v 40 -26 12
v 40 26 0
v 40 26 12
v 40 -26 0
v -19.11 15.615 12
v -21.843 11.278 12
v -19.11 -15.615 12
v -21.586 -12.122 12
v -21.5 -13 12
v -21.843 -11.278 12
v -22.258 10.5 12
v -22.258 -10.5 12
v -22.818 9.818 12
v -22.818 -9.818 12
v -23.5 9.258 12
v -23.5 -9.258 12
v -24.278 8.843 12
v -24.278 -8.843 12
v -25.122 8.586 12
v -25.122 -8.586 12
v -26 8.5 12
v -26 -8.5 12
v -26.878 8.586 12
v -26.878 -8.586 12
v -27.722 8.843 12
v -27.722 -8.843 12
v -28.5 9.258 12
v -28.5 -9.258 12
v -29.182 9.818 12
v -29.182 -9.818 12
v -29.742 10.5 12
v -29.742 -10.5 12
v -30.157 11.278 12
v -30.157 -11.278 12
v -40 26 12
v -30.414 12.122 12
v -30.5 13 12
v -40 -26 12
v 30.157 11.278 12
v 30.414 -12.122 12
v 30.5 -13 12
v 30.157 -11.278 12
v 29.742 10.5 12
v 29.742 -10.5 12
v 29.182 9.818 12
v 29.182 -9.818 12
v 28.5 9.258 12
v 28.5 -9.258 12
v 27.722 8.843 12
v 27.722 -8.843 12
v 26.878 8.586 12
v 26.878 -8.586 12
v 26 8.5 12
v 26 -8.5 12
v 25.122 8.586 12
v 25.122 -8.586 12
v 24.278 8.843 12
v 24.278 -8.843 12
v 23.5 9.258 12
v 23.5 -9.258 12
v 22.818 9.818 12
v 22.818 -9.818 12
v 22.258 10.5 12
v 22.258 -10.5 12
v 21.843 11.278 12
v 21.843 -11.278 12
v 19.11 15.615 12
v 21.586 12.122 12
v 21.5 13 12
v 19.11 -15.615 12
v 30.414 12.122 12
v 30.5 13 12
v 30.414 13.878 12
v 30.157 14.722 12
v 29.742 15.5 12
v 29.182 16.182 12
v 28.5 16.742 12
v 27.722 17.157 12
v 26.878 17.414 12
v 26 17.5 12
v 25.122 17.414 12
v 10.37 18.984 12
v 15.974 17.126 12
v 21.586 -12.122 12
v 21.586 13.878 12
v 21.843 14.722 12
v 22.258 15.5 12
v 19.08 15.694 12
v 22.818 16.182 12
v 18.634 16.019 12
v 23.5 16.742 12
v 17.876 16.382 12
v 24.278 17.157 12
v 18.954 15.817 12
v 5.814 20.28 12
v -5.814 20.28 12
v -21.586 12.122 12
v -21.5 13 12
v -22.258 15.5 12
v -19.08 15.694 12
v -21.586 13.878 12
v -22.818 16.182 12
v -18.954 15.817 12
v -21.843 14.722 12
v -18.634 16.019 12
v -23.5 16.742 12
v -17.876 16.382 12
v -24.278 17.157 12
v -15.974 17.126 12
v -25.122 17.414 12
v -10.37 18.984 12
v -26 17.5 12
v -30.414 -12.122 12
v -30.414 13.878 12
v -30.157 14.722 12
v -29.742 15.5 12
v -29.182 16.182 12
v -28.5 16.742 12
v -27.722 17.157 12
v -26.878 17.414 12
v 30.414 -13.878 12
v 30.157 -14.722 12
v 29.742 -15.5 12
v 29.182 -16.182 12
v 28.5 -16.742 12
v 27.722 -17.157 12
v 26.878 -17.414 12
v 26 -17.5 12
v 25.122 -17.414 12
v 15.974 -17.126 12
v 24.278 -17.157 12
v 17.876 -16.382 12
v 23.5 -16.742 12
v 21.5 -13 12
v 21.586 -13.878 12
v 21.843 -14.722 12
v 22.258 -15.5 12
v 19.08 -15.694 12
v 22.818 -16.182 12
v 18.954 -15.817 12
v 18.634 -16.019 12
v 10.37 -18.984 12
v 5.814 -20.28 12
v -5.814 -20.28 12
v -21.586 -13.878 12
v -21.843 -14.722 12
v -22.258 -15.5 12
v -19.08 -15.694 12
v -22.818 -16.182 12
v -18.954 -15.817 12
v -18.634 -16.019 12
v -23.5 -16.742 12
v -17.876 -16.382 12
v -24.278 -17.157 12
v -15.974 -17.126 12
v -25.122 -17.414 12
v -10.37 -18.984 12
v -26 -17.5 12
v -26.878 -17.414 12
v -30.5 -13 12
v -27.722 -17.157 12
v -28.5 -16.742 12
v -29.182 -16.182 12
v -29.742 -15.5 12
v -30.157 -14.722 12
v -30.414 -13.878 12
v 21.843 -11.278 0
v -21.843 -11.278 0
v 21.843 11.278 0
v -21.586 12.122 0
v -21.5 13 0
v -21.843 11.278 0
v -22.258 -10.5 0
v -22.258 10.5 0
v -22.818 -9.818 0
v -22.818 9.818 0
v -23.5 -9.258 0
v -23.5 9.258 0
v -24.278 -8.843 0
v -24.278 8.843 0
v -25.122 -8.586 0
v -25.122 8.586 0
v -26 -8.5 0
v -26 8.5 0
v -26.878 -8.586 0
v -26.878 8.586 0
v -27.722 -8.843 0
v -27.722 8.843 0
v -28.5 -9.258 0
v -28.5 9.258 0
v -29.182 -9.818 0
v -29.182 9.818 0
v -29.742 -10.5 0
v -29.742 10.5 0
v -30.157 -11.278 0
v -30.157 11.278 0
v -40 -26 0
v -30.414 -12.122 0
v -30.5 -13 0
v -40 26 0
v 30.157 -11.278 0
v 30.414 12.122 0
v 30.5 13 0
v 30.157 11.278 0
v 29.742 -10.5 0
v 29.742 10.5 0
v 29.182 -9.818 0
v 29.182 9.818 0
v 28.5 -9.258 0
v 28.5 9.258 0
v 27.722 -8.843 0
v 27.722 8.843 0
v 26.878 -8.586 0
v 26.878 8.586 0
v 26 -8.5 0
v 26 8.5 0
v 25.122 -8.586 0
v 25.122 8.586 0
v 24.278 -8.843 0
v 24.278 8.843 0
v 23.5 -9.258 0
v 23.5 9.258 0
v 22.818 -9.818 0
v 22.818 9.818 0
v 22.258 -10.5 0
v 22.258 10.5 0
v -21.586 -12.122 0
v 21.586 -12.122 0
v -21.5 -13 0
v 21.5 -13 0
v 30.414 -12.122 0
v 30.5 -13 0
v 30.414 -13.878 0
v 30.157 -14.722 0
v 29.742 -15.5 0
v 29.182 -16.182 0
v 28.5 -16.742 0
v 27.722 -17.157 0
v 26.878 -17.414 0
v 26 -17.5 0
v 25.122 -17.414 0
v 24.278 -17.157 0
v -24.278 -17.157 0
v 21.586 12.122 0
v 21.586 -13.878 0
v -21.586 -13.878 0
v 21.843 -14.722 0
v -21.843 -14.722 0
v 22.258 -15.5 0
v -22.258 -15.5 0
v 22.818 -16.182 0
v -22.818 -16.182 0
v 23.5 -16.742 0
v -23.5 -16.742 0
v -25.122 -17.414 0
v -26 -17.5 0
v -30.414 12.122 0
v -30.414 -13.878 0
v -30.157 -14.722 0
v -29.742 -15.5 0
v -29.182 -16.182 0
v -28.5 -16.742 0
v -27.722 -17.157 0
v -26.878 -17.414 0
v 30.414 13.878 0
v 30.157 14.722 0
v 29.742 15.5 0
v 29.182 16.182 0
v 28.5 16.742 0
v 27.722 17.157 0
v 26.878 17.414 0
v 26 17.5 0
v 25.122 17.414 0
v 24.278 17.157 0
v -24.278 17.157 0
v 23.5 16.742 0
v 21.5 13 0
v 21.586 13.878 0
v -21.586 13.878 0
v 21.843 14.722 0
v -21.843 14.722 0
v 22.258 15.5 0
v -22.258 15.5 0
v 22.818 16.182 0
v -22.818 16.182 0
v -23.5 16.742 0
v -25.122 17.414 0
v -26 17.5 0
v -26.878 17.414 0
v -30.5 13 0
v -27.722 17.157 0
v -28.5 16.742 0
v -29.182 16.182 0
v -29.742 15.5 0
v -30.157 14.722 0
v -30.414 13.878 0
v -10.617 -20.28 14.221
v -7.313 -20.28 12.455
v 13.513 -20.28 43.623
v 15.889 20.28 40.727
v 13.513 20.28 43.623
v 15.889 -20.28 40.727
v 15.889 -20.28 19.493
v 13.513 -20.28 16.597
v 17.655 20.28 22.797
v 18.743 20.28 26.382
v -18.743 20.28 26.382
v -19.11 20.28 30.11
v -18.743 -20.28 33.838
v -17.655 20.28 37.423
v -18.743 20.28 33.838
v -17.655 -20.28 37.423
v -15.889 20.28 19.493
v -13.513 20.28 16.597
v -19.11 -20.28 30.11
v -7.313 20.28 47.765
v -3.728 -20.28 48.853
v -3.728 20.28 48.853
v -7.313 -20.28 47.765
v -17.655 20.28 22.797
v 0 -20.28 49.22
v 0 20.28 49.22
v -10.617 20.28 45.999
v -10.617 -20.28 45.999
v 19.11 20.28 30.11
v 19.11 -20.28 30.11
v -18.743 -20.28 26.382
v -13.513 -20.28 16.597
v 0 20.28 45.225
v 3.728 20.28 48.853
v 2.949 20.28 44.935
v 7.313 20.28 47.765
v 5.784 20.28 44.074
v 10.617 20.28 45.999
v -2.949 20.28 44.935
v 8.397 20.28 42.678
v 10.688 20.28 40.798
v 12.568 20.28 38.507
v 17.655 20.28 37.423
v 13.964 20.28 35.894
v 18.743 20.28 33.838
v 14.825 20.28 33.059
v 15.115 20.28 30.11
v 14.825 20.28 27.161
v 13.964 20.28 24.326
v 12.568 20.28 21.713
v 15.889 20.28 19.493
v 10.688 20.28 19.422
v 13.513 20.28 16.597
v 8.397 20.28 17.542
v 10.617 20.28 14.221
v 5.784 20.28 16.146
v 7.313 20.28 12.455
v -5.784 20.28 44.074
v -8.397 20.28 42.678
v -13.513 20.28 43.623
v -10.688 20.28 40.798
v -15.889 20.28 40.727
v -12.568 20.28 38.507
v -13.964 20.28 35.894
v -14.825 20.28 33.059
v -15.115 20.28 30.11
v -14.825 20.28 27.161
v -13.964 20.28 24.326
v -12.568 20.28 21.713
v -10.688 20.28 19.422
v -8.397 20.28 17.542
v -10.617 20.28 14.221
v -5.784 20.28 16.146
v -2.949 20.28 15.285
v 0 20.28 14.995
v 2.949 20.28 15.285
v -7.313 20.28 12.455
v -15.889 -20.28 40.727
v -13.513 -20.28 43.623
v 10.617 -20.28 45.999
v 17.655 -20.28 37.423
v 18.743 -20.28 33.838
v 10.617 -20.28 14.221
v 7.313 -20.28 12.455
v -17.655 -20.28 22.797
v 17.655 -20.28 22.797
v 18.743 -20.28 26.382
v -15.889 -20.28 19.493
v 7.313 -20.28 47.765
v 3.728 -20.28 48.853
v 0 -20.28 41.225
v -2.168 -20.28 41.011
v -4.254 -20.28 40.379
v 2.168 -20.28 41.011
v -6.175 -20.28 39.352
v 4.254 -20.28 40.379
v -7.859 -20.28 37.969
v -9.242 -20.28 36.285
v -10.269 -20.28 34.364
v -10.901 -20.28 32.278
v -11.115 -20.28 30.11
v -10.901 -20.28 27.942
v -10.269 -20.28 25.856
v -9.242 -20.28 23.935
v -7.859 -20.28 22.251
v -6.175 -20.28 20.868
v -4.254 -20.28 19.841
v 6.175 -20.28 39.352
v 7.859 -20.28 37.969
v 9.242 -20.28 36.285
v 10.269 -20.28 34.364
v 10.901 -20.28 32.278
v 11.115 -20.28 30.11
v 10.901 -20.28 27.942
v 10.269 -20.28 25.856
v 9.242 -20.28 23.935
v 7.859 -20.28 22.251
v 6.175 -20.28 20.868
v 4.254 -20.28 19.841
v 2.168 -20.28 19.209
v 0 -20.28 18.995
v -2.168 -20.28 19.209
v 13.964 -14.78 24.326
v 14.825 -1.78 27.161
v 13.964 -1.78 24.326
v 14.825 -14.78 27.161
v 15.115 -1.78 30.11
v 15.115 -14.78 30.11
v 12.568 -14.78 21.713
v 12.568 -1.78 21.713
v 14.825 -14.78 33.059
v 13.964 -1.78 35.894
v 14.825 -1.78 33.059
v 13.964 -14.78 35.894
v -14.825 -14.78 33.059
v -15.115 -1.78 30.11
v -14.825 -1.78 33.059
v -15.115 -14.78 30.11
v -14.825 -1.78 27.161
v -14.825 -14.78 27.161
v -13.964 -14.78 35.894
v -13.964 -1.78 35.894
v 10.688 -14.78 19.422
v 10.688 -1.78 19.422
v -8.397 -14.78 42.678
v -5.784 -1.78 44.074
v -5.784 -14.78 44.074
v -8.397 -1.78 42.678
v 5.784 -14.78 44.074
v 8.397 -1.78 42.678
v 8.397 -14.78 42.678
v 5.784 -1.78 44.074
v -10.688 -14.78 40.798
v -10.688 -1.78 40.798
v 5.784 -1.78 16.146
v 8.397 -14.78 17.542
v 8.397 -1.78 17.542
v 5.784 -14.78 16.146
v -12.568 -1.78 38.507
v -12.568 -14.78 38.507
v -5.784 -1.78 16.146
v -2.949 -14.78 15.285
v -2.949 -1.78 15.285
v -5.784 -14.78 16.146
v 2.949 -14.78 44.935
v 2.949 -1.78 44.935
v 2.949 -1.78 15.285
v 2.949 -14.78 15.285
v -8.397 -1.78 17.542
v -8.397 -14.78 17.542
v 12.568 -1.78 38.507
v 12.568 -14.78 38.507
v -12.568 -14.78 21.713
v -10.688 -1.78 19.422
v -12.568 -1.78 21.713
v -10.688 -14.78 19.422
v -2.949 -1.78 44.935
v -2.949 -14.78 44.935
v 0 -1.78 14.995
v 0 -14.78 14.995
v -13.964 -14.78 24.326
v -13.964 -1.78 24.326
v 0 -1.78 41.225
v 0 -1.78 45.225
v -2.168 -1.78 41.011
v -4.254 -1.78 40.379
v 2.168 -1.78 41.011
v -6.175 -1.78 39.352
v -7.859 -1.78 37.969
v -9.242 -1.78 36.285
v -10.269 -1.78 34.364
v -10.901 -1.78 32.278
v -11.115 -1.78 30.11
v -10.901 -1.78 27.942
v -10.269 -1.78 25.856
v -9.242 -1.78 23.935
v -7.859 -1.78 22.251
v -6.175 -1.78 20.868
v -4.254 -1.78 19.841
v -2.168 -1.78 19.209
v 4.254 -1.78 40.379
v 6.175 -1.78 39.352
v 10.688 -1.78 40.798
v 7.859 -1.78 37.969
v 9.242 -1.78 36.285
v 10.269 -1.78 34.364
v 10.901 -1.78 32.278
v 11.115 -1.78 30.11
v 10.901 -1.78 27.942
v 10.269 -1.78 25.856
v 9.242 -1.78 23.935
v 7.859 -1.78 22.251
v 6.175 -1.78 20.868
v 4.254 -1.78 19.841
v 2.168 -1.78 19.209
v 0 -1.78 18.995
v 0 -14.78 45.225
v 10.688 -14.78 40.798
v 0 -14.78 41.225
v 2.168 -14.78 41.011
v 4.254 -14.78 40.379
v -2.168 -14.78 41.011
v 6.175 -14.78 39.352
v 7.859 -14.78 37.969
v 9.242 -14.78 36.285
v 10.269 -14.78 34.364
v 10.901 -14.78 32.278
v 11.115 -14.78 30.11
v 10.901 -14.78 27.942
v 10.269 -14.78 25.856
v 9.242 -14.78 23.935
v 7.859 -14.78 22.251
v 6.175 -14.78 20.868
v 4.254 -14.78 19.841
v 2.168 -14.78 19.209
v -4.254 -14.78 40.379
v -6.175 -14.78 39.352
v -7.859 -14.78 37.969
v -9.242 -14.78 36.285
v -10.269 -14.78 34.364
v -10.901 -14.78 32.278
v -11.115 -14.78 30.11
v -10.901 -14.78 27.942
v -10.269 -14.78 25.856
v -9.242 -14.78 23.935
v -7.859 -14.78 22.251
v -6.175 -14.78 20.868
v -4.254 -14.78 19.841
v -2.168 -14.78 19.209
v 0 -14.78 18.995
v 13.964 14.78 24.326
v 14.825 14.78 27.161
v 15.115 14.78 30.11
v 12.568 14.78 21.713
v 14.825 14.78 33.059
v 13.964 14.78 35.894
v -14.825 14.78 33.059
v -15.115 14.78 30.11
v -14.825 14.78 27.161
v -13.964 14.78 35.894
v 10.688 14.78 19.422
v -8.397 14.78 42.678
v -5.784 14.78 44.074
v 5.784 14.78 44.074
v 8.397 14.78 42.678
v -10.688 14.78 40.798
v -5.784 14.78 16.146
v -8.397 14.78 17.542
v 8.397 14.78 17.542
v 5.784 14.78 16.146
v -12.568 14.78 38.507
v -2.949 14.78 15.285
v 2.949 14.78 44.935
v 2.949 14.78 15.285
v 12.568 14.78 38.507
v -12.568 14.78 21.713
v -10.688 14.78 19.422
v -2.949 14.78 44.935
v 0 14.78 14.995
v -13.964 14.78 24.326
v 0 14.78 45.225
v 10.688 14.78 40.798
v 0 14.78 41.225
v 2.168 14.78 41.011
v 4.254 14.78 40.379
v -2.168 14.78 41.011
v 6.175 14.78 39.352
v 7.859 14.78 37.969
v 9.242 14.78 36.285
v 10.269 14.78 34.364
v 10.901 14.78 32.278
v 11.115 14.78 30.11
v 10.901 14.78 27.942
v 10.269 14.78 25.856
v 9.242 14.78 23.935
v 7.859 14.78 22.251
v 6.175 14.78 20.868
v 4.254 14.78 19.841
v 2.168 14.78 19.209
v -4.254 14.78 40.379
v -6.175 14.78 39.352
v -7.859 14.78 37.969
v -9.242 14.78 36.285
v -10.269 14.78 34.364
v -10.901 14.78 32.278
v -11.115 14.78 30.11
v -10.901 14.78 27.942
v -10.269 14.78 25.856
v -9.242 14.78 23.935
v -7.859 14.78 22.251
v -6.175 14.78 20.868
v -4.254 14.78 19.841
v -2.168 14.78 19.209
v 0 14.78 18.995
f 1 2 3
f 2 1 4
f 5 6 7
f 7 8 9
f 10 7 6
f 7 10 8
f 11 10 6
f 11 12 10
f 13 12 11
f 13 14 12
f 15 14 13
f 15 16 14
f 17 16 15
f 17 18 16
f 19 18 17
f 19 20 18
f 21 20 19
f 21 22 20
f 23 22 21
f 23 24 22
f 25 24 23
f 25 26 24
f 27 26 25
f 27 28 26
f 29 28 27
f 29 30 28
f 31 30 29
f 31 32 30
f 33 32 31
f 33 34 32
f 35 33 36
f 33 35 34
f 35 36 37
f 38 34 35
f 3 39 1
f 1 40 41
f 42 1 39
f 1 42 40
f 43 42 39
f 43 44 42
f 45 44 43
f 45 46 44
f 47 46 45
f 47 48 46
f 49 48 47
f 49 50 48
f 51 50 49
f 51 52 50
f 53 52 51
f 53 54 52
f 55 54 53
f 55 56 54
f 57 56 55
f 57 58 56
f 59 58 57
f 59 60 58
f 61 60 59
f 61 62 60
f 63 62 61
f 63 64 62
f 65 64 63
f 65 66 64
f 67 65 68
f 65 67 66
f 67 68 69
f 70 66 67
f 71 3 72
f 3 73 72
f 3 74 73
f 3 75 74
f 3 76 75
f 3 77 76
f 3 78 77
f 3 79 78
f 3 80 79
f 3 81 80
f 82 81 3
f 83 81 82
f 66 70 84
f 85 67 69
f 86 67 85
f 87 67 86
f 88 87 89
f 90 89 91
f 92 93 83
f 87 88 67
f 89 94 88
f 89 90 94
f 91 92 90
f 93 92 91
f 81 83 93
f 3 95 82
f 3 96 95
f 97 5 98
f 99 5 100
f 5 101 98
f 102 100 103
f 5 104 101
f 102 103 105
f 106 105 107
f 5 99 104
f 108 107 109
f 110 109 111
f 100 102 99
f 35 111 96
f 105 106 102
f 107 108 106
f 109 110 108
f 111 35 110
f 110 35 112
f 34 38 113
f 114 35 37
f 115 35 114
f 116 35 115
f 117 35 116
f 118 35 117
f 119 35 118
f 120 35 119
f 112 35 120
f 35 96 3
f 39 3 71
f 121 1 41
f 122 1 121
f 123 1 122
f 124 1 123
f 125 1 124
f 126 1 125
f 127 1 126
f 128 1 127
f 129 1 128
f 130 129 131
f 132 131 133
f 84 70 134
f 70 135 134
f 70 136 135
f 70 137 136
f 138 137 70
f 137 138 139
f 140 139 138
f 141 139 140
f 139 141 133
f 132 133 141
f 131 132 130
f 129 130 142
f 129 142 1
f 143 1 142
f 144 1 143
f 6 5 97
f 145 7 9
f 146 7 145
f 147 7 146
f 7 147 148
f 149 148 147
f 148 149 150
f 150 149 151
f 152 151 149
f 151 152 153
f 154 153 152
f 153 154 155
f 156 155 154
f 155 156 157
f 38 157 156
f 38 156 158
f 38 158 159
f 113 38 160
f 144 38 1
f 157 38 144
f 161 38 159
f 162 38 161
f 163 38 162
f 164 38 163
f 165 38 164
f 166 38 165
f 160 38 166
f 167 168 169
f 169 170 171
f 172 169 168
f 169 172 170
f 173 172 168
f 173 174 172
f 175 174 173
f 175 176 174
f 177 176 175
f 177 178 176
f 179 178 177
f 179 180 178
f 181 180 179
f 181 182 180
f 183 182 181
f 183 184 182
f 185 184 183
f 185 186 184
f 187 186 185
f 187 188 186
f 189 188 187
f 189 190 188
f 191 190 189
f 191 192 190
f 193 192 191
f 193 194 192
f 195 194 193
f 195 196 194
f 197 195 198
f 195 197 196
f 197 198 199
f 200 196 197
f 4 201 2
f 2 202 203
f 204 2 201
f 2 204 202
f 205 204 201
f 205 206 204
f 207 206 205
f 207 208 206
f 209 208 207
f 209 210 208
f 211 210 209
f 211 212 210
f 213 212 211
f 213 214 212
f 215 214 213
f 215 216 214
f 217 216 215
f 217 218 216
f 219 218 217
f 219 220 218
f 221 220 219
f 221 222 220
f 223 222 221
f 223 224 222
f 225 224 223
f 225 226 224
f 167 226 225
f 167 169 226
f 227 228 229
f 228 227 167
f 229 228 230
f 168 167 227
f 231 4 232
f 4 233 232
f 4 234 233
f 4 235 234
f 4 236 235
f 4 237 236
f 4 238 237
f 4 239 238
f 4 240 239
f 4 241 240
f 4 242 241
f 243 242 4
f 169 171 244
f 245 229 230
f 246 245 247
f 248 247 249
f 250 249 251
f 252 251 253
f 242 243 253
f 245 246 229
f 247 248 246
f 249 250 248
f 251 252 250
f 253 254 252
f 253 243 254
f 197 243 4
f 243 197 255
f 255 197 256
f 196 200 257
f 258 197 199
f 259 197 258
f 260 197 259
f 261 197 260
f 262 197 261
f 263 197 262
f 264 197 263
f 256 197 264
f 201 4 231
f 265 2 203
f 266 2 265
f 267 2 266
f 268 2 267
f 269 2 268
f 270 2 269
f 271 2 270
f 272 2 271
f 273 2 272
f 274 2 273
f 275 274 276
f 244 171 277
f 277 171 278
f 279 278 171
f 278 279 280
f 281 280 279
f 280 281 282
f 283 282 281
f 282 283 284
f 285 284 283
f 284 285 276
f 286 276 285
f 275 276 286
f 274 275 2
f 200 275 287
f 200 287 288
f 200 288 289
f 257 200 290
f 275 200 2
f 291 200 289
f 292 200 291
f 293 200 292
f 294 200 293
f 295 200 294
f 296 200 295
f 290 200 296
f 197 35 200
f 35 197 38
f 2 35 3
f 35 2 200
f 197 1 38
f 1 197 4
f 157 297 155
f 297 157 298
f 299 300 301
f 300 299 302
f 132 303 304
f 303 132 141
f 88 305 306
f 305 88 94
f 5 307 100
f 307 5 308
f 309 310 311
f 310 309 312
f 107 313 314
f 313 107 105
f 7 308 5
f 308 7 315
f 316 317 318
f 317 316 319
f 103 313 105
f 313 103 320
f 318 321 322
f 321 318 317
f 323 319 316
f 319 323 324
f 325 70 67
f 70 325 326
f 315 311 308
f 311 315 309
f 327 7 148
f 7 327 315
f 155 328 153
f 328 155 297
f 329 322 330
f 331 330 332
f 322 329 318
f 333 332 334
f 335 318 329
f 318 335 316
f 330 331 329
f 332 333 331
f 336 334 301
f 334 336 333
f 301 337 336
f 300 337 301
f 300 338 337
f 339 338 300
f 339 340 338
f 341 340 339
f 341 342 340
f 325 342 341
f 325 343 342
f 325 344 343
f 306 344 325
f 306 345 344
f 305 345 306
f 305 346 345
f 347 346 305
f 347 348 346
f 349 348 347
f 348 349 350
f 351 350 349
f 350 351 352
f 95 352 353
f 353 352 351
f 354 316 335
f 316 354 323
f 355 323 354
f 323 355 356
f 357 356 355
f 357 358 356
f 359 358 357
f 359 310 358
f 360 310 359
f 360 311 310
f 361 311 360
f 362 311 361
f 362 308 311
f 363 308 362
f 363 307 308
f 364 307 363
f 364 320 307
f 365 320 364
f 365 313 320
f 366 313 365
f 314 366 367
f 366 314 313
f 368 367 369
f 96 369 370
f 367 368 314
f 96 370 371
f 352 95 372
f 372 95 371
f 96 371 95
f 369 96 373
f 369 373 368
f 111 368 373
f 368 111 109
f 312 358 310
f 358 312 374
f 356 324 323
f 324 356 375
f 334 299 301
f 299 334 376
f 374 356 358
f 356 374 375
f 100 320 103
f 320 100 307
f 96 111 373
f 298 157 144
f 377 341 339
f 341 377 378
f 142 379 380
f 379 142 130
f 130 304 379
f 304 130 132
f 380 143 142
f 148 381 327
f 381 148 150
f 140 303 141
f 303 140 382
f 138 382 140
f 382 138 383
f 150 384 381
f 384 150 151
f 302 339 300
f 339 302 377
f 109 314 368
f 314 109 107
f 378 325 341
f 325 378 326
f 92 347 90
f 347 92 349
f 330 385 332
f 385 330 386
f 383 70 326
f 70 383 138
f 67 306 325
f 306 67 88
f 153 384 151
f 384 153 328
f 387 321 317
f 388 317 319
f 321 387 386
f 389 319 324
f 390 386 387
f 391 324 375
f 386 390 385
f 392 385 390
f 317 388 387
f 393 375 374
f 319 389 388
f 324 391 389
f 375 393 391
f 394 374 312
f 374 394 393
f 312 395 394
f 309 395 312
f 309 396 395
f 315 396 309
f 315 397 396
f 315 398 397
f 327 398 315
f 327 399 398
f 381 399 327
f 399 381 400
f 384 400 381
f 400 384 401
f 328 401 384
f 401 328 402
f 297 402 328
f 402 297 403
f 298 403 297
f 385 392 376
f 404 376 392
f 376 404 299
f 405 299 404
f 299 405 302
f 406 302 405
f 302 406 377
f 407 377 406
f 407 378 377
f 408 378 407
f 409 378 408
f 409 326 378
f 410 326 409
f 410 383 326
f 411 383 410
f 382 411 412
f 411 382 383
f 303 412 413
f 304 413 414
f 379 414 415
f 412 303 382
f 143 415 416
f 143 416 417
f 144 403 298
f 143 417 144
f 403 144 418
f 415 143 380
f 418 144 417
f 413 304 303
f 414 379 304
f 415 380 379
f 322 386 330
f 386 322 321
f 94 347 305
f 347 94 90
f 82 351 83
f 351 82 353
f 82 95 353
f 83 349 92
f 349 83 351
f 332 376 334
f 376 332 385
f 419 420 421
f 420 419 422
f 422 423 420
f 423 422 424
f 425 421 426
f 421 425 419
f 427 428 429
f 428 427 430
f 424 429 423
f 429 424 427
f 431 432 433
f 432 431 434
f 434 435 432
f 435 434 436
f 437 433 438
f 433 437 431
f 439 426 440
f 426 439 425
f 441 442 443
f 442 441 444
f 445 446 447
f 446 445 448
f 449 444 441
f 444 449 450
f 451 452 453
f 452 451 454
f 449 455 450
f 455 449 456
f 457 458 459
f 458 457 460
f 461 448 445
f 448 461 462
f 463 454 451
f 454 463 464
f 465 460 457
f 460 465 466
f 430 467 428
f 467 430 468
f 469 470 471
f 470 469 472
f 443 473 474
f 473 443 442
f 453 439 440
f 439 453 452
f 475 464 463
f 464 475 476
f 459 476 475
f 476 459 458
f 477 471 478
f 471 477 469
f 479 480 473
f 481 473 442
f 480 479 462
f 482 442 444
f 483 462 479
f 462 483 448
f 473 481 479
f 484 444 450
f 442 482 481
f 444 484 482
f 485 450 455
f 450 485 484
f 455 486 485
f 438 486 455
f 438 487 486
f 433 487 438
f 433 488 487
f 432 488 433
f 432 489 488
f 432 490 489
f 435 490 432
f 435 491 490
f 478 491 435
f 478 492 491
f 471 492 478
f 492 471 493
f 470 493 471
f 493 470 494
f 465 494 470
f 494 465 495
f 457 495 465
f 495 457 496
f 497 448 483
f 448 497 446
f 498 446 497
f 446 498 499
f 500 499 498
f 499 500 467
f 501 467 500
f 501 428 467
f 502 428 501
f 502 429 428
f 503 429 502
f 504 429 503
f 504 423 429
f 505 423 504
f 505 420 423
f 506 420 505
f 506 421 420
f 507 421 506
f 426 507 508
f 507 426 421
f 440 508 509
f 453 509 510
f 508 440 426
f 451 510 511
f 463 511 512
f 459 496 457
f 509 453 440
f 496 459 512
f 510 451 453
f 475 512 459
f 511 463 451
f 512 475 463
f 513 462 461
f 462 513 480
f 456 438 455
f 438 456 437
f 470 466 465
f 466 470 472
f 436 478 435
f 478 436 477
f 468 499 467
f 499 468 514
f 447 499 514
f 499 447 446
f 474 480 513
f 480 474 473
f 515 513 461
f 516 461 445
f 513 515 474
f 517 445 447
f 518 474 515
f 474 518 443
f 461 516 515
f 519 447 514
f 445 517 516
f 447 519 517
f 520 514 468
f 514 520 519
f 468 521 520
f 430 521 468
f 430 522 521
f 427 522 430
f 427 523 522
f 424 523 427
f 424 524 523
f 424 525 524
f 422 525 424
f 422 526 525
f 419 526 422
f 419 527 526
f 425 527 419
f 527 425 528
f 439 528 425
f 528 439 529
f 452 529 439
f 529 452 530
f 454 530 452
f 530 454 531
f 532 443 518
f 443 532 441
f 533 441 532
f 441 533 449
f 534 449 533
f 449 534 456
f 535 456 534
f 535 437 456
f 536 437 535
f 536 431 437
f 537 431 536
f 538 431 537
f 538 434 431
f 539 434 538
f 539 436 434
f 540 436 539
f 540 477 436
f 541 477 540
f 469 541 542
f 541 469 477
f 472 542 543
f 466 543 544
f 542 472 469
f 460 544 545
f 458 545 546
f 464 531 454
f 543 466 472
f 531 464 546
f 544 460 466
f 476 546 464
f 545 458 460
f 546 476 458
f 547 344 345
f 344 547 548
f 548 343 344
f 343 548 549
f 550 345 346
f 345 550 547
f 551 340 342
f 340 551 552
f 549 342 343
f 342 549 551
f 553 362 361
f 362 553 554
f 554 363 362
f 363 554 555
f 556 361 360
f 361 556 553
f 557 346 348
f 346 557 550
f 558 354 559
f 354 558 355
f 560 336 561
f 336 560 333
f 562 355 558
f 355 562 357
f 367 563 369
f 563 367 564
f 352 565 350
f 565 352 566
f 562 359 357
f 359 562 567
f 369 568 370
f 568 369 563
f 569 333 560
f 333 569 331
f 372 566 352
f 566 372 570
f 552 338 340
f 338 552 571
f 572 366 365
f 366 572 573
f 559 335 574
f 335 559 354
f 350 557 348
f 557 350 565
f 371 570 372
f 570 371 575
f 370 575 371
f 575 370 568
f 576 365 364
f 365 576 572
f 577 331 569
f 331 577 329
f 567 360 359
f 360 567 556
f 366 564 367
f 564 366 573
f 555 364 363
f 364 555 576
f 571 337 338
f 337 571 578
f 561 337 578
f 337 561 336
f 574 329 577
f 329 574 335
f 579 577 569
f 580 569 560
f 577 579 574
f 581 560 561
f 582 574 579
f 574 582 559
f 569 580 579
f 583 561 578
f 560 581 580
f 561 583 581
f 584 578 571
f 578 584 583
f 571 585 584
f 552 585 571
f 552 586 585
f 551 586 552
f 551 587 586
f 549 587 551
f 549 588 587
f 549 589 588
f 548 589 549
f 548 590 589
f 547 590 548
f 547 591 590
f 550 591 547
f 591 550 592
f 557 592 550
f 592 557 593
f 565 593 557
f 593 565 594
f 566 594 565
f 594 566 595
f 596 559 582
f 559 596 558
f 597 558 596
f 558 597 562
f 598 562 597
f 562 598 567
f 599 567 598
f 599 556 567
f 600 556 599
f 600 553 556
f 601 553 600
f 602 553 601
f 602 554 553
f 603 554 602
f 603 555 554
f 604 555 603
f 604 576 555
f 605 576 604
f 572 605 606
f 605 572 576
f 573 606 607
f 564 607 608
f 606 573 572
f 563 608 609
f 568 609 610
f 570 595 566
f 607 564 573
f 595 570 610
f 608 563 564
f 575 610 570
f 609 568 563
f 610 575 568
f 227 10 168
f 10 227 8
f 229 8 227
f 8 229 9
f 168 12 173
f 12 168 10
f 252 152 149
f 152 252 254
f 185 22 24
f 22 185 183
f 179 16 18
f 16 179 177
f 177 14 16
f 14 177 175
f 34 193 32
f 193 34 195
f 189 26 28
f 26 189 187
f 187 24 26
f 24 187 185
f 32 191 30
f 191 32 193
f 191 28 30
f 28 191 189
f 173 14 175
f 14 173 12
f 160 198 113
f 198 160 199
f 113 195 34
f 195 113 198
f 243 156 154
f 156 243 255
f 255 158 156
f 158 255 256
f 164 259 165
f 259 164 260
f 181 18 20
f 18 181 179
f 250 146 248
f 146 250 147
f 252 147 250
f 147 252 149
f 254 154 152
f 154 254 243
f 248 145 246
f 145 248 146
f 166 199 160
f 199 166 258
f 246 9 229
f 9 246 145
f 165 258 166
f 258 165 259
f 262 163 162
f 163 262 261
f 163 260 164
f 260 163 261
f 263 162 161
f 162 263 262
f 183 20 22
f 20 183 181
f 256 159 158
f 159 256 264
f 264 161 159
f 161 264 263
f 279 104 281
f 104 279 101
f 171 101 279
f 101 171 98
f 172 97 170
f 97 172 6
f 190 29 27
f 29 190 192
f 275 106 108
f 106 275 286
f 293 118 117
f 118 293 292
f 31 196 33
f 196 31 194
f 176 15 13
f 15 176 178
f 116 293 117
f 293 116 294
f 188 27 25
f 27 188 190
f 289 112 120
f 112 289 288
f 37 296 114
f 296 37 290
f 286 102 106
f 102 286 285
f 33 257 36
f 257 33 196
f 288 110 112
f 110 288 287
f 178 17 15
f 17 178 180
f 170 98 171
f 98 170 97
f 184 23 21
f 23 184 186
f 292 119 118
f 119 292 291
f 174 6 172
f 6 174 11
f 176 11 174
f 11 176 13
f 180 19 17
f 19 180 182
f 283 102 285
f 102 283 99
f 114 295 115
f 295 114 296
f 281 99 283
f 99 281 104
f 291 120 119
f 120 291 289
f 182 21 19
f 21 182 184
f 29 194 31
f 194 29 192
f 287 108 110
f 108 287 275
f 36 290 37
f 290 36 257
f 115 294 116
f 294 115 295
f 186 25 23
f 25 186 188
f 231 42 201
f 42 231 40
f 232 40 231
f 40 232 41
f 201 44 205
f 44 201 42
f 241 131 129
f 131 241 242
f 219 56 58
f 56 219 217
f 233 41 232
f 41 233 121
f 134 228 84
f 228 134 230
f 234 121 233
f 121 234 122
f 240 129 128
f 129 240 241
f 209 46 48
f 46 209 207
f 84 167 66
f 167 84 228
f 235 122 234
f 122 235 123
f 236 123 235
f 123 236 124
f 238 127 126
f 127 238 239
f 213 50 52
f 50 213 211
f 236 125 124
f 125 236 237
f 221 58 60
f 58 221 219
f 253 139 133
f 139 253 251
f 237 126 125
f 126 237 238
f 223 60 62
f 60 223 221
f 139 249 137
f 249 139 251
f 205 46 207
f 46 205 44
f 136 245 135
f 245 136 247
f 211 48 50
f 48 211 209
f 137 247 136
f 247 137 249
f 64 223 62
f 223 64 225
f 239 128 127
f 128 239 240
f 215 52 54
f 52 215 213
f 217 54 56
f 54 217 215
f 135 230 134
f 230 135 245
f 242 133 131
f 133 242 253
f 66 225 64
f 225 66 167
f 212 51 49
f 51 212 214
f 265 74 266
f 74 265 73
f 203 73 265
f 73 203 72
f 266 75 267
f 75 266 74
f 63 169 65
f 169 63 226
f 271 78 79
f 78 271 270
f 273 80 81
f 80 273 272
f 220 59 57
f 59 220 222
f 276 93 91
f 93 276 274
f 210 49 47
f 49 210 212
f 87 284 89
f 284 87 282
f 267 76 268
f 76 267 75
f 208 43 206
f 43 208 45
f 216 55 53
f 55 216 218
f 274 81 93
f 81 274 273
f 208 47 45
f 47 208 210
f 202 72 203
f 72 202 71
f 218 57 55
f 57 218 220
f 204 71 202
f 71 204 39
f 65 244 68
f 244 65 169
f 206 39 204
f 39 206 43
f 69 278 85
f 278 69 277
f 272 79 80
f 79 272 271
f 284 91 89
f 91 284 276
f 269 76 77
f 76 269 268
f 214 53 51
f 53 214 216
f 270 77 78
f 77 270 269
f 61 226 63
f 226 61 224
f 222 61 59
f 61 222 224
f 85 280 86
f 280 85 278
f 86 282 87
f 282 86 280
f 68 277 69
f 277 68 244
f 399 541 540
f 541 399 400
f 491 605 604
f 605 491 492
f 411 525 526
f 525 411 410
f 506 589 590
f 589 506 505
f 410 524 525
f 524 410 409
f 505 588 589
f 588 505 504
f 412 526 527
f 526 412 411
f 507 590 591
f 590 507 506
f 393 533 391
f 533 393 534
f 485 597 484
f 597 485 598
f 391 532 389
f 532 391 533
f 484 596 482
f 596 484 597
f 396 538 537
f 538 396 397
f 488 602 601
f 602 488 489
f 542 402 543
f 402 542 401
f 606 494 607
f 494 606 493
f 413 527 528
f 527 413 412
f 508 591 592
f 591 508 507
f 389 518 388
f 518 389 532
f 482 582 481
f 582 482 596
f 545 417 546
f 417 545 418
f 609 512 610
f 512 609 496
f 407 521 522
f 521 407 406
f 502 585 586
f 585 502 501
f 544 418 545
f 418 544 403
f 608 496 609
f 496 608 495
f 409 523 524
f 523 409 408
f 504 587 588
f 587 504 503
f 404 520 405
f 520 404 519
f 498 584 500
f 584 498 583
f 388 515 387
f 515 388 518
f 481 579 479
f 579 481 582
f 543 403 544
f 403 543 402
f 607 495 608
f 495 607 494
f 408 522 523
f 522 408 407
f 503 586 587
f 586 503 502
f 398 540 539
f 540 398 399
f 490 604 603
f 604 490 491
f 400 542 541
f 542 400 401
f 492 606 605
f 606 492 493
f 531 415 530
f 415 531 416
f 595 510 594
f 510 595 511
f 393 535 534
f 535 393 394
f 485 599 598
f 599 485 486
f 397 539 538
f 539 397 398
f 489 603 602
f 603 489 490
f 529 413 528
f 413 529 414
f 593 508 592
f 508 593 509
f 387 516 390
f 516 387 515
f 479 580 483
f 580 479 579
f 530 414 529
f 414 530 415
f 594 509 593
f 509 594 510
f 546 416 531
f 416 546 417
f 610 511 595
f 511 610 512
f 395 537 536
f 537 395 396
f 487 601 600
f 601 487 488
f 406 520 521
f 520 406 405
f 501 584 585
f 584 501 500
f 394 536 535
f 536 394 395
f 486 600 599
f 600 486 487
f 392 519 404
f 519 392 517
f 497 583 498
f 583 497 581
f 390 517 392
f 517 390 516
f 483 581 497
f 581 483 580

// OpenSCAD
$fn = 32;

// ----------------------------------------------------------------------
// Bearing block: 80 x 52 mm base, 22.23 mm bore at 30.11 mm
// ----------------------------------------------------------------------

// --- parameters (mm) ---
base_w = 80;              // base width
base_d = 52;              // base depth
base_t = 12;              // base thickness
bore_d = 22.23;           // shaft / bearing bore
house_r = 19.11;          // housing outer radius
house_len = 40.56;        // housing length along the shaft
foot_w = 38.22;           // foot width under the housing
foot_len = 30.56;         // foot length along the shaft
axis_z = 30.11;           // bore axis height above the base
holes_d = 9;              // mounting holes
hole_x = 26;              // mounting hole spacing
seat_d = 8;               // bearing seat depth
seat_wall = 4;            // seat wall thickness

difference() {
  union() {
    /* base plate with its underside on z = 0 */
    translate([0, 0, base_t / 2]) cube([base_w, base_d, base_t], center = true);
    /* hull foot: a straight web blending into the round housing */
    hull() {
      translate([0, 0, base_t - 0.5]) cube([foot_w, foot_len, 1.6], center = true);
      translate([0, 0, axis_z]) rotate([-90, 0, 0]) cylinder(h = house_len, d = 2 * house_r, center = true);
    }
  }
  /* bore through the housing, 2.5 mm clear on both sides */
  translate([0, 0, axis_z]) rotate([-90, 0, 0]) cylinder(h = house_len + 5, d = bore_d, center = true);
  /* bearing seats, recessed into both ends of the housing */
  for (sy = [-1, 1]) {
    translate([0, sy * (house_len / 2 - seat_d + 2.5), axis_z]) rotate([-90, 0, 0]) cylinder(h = seat_d + 5, d = bore_d + 2 * seat_wall);
  }
  /* mounting holes through the base plate */
  for (hx = [-26, 26]) {
    for (hy = [-13, 13]) {
      translate([hx, hy, -2.5]) cylinder(h = base_t + 5, d = holes_d);
    }
  }
}
